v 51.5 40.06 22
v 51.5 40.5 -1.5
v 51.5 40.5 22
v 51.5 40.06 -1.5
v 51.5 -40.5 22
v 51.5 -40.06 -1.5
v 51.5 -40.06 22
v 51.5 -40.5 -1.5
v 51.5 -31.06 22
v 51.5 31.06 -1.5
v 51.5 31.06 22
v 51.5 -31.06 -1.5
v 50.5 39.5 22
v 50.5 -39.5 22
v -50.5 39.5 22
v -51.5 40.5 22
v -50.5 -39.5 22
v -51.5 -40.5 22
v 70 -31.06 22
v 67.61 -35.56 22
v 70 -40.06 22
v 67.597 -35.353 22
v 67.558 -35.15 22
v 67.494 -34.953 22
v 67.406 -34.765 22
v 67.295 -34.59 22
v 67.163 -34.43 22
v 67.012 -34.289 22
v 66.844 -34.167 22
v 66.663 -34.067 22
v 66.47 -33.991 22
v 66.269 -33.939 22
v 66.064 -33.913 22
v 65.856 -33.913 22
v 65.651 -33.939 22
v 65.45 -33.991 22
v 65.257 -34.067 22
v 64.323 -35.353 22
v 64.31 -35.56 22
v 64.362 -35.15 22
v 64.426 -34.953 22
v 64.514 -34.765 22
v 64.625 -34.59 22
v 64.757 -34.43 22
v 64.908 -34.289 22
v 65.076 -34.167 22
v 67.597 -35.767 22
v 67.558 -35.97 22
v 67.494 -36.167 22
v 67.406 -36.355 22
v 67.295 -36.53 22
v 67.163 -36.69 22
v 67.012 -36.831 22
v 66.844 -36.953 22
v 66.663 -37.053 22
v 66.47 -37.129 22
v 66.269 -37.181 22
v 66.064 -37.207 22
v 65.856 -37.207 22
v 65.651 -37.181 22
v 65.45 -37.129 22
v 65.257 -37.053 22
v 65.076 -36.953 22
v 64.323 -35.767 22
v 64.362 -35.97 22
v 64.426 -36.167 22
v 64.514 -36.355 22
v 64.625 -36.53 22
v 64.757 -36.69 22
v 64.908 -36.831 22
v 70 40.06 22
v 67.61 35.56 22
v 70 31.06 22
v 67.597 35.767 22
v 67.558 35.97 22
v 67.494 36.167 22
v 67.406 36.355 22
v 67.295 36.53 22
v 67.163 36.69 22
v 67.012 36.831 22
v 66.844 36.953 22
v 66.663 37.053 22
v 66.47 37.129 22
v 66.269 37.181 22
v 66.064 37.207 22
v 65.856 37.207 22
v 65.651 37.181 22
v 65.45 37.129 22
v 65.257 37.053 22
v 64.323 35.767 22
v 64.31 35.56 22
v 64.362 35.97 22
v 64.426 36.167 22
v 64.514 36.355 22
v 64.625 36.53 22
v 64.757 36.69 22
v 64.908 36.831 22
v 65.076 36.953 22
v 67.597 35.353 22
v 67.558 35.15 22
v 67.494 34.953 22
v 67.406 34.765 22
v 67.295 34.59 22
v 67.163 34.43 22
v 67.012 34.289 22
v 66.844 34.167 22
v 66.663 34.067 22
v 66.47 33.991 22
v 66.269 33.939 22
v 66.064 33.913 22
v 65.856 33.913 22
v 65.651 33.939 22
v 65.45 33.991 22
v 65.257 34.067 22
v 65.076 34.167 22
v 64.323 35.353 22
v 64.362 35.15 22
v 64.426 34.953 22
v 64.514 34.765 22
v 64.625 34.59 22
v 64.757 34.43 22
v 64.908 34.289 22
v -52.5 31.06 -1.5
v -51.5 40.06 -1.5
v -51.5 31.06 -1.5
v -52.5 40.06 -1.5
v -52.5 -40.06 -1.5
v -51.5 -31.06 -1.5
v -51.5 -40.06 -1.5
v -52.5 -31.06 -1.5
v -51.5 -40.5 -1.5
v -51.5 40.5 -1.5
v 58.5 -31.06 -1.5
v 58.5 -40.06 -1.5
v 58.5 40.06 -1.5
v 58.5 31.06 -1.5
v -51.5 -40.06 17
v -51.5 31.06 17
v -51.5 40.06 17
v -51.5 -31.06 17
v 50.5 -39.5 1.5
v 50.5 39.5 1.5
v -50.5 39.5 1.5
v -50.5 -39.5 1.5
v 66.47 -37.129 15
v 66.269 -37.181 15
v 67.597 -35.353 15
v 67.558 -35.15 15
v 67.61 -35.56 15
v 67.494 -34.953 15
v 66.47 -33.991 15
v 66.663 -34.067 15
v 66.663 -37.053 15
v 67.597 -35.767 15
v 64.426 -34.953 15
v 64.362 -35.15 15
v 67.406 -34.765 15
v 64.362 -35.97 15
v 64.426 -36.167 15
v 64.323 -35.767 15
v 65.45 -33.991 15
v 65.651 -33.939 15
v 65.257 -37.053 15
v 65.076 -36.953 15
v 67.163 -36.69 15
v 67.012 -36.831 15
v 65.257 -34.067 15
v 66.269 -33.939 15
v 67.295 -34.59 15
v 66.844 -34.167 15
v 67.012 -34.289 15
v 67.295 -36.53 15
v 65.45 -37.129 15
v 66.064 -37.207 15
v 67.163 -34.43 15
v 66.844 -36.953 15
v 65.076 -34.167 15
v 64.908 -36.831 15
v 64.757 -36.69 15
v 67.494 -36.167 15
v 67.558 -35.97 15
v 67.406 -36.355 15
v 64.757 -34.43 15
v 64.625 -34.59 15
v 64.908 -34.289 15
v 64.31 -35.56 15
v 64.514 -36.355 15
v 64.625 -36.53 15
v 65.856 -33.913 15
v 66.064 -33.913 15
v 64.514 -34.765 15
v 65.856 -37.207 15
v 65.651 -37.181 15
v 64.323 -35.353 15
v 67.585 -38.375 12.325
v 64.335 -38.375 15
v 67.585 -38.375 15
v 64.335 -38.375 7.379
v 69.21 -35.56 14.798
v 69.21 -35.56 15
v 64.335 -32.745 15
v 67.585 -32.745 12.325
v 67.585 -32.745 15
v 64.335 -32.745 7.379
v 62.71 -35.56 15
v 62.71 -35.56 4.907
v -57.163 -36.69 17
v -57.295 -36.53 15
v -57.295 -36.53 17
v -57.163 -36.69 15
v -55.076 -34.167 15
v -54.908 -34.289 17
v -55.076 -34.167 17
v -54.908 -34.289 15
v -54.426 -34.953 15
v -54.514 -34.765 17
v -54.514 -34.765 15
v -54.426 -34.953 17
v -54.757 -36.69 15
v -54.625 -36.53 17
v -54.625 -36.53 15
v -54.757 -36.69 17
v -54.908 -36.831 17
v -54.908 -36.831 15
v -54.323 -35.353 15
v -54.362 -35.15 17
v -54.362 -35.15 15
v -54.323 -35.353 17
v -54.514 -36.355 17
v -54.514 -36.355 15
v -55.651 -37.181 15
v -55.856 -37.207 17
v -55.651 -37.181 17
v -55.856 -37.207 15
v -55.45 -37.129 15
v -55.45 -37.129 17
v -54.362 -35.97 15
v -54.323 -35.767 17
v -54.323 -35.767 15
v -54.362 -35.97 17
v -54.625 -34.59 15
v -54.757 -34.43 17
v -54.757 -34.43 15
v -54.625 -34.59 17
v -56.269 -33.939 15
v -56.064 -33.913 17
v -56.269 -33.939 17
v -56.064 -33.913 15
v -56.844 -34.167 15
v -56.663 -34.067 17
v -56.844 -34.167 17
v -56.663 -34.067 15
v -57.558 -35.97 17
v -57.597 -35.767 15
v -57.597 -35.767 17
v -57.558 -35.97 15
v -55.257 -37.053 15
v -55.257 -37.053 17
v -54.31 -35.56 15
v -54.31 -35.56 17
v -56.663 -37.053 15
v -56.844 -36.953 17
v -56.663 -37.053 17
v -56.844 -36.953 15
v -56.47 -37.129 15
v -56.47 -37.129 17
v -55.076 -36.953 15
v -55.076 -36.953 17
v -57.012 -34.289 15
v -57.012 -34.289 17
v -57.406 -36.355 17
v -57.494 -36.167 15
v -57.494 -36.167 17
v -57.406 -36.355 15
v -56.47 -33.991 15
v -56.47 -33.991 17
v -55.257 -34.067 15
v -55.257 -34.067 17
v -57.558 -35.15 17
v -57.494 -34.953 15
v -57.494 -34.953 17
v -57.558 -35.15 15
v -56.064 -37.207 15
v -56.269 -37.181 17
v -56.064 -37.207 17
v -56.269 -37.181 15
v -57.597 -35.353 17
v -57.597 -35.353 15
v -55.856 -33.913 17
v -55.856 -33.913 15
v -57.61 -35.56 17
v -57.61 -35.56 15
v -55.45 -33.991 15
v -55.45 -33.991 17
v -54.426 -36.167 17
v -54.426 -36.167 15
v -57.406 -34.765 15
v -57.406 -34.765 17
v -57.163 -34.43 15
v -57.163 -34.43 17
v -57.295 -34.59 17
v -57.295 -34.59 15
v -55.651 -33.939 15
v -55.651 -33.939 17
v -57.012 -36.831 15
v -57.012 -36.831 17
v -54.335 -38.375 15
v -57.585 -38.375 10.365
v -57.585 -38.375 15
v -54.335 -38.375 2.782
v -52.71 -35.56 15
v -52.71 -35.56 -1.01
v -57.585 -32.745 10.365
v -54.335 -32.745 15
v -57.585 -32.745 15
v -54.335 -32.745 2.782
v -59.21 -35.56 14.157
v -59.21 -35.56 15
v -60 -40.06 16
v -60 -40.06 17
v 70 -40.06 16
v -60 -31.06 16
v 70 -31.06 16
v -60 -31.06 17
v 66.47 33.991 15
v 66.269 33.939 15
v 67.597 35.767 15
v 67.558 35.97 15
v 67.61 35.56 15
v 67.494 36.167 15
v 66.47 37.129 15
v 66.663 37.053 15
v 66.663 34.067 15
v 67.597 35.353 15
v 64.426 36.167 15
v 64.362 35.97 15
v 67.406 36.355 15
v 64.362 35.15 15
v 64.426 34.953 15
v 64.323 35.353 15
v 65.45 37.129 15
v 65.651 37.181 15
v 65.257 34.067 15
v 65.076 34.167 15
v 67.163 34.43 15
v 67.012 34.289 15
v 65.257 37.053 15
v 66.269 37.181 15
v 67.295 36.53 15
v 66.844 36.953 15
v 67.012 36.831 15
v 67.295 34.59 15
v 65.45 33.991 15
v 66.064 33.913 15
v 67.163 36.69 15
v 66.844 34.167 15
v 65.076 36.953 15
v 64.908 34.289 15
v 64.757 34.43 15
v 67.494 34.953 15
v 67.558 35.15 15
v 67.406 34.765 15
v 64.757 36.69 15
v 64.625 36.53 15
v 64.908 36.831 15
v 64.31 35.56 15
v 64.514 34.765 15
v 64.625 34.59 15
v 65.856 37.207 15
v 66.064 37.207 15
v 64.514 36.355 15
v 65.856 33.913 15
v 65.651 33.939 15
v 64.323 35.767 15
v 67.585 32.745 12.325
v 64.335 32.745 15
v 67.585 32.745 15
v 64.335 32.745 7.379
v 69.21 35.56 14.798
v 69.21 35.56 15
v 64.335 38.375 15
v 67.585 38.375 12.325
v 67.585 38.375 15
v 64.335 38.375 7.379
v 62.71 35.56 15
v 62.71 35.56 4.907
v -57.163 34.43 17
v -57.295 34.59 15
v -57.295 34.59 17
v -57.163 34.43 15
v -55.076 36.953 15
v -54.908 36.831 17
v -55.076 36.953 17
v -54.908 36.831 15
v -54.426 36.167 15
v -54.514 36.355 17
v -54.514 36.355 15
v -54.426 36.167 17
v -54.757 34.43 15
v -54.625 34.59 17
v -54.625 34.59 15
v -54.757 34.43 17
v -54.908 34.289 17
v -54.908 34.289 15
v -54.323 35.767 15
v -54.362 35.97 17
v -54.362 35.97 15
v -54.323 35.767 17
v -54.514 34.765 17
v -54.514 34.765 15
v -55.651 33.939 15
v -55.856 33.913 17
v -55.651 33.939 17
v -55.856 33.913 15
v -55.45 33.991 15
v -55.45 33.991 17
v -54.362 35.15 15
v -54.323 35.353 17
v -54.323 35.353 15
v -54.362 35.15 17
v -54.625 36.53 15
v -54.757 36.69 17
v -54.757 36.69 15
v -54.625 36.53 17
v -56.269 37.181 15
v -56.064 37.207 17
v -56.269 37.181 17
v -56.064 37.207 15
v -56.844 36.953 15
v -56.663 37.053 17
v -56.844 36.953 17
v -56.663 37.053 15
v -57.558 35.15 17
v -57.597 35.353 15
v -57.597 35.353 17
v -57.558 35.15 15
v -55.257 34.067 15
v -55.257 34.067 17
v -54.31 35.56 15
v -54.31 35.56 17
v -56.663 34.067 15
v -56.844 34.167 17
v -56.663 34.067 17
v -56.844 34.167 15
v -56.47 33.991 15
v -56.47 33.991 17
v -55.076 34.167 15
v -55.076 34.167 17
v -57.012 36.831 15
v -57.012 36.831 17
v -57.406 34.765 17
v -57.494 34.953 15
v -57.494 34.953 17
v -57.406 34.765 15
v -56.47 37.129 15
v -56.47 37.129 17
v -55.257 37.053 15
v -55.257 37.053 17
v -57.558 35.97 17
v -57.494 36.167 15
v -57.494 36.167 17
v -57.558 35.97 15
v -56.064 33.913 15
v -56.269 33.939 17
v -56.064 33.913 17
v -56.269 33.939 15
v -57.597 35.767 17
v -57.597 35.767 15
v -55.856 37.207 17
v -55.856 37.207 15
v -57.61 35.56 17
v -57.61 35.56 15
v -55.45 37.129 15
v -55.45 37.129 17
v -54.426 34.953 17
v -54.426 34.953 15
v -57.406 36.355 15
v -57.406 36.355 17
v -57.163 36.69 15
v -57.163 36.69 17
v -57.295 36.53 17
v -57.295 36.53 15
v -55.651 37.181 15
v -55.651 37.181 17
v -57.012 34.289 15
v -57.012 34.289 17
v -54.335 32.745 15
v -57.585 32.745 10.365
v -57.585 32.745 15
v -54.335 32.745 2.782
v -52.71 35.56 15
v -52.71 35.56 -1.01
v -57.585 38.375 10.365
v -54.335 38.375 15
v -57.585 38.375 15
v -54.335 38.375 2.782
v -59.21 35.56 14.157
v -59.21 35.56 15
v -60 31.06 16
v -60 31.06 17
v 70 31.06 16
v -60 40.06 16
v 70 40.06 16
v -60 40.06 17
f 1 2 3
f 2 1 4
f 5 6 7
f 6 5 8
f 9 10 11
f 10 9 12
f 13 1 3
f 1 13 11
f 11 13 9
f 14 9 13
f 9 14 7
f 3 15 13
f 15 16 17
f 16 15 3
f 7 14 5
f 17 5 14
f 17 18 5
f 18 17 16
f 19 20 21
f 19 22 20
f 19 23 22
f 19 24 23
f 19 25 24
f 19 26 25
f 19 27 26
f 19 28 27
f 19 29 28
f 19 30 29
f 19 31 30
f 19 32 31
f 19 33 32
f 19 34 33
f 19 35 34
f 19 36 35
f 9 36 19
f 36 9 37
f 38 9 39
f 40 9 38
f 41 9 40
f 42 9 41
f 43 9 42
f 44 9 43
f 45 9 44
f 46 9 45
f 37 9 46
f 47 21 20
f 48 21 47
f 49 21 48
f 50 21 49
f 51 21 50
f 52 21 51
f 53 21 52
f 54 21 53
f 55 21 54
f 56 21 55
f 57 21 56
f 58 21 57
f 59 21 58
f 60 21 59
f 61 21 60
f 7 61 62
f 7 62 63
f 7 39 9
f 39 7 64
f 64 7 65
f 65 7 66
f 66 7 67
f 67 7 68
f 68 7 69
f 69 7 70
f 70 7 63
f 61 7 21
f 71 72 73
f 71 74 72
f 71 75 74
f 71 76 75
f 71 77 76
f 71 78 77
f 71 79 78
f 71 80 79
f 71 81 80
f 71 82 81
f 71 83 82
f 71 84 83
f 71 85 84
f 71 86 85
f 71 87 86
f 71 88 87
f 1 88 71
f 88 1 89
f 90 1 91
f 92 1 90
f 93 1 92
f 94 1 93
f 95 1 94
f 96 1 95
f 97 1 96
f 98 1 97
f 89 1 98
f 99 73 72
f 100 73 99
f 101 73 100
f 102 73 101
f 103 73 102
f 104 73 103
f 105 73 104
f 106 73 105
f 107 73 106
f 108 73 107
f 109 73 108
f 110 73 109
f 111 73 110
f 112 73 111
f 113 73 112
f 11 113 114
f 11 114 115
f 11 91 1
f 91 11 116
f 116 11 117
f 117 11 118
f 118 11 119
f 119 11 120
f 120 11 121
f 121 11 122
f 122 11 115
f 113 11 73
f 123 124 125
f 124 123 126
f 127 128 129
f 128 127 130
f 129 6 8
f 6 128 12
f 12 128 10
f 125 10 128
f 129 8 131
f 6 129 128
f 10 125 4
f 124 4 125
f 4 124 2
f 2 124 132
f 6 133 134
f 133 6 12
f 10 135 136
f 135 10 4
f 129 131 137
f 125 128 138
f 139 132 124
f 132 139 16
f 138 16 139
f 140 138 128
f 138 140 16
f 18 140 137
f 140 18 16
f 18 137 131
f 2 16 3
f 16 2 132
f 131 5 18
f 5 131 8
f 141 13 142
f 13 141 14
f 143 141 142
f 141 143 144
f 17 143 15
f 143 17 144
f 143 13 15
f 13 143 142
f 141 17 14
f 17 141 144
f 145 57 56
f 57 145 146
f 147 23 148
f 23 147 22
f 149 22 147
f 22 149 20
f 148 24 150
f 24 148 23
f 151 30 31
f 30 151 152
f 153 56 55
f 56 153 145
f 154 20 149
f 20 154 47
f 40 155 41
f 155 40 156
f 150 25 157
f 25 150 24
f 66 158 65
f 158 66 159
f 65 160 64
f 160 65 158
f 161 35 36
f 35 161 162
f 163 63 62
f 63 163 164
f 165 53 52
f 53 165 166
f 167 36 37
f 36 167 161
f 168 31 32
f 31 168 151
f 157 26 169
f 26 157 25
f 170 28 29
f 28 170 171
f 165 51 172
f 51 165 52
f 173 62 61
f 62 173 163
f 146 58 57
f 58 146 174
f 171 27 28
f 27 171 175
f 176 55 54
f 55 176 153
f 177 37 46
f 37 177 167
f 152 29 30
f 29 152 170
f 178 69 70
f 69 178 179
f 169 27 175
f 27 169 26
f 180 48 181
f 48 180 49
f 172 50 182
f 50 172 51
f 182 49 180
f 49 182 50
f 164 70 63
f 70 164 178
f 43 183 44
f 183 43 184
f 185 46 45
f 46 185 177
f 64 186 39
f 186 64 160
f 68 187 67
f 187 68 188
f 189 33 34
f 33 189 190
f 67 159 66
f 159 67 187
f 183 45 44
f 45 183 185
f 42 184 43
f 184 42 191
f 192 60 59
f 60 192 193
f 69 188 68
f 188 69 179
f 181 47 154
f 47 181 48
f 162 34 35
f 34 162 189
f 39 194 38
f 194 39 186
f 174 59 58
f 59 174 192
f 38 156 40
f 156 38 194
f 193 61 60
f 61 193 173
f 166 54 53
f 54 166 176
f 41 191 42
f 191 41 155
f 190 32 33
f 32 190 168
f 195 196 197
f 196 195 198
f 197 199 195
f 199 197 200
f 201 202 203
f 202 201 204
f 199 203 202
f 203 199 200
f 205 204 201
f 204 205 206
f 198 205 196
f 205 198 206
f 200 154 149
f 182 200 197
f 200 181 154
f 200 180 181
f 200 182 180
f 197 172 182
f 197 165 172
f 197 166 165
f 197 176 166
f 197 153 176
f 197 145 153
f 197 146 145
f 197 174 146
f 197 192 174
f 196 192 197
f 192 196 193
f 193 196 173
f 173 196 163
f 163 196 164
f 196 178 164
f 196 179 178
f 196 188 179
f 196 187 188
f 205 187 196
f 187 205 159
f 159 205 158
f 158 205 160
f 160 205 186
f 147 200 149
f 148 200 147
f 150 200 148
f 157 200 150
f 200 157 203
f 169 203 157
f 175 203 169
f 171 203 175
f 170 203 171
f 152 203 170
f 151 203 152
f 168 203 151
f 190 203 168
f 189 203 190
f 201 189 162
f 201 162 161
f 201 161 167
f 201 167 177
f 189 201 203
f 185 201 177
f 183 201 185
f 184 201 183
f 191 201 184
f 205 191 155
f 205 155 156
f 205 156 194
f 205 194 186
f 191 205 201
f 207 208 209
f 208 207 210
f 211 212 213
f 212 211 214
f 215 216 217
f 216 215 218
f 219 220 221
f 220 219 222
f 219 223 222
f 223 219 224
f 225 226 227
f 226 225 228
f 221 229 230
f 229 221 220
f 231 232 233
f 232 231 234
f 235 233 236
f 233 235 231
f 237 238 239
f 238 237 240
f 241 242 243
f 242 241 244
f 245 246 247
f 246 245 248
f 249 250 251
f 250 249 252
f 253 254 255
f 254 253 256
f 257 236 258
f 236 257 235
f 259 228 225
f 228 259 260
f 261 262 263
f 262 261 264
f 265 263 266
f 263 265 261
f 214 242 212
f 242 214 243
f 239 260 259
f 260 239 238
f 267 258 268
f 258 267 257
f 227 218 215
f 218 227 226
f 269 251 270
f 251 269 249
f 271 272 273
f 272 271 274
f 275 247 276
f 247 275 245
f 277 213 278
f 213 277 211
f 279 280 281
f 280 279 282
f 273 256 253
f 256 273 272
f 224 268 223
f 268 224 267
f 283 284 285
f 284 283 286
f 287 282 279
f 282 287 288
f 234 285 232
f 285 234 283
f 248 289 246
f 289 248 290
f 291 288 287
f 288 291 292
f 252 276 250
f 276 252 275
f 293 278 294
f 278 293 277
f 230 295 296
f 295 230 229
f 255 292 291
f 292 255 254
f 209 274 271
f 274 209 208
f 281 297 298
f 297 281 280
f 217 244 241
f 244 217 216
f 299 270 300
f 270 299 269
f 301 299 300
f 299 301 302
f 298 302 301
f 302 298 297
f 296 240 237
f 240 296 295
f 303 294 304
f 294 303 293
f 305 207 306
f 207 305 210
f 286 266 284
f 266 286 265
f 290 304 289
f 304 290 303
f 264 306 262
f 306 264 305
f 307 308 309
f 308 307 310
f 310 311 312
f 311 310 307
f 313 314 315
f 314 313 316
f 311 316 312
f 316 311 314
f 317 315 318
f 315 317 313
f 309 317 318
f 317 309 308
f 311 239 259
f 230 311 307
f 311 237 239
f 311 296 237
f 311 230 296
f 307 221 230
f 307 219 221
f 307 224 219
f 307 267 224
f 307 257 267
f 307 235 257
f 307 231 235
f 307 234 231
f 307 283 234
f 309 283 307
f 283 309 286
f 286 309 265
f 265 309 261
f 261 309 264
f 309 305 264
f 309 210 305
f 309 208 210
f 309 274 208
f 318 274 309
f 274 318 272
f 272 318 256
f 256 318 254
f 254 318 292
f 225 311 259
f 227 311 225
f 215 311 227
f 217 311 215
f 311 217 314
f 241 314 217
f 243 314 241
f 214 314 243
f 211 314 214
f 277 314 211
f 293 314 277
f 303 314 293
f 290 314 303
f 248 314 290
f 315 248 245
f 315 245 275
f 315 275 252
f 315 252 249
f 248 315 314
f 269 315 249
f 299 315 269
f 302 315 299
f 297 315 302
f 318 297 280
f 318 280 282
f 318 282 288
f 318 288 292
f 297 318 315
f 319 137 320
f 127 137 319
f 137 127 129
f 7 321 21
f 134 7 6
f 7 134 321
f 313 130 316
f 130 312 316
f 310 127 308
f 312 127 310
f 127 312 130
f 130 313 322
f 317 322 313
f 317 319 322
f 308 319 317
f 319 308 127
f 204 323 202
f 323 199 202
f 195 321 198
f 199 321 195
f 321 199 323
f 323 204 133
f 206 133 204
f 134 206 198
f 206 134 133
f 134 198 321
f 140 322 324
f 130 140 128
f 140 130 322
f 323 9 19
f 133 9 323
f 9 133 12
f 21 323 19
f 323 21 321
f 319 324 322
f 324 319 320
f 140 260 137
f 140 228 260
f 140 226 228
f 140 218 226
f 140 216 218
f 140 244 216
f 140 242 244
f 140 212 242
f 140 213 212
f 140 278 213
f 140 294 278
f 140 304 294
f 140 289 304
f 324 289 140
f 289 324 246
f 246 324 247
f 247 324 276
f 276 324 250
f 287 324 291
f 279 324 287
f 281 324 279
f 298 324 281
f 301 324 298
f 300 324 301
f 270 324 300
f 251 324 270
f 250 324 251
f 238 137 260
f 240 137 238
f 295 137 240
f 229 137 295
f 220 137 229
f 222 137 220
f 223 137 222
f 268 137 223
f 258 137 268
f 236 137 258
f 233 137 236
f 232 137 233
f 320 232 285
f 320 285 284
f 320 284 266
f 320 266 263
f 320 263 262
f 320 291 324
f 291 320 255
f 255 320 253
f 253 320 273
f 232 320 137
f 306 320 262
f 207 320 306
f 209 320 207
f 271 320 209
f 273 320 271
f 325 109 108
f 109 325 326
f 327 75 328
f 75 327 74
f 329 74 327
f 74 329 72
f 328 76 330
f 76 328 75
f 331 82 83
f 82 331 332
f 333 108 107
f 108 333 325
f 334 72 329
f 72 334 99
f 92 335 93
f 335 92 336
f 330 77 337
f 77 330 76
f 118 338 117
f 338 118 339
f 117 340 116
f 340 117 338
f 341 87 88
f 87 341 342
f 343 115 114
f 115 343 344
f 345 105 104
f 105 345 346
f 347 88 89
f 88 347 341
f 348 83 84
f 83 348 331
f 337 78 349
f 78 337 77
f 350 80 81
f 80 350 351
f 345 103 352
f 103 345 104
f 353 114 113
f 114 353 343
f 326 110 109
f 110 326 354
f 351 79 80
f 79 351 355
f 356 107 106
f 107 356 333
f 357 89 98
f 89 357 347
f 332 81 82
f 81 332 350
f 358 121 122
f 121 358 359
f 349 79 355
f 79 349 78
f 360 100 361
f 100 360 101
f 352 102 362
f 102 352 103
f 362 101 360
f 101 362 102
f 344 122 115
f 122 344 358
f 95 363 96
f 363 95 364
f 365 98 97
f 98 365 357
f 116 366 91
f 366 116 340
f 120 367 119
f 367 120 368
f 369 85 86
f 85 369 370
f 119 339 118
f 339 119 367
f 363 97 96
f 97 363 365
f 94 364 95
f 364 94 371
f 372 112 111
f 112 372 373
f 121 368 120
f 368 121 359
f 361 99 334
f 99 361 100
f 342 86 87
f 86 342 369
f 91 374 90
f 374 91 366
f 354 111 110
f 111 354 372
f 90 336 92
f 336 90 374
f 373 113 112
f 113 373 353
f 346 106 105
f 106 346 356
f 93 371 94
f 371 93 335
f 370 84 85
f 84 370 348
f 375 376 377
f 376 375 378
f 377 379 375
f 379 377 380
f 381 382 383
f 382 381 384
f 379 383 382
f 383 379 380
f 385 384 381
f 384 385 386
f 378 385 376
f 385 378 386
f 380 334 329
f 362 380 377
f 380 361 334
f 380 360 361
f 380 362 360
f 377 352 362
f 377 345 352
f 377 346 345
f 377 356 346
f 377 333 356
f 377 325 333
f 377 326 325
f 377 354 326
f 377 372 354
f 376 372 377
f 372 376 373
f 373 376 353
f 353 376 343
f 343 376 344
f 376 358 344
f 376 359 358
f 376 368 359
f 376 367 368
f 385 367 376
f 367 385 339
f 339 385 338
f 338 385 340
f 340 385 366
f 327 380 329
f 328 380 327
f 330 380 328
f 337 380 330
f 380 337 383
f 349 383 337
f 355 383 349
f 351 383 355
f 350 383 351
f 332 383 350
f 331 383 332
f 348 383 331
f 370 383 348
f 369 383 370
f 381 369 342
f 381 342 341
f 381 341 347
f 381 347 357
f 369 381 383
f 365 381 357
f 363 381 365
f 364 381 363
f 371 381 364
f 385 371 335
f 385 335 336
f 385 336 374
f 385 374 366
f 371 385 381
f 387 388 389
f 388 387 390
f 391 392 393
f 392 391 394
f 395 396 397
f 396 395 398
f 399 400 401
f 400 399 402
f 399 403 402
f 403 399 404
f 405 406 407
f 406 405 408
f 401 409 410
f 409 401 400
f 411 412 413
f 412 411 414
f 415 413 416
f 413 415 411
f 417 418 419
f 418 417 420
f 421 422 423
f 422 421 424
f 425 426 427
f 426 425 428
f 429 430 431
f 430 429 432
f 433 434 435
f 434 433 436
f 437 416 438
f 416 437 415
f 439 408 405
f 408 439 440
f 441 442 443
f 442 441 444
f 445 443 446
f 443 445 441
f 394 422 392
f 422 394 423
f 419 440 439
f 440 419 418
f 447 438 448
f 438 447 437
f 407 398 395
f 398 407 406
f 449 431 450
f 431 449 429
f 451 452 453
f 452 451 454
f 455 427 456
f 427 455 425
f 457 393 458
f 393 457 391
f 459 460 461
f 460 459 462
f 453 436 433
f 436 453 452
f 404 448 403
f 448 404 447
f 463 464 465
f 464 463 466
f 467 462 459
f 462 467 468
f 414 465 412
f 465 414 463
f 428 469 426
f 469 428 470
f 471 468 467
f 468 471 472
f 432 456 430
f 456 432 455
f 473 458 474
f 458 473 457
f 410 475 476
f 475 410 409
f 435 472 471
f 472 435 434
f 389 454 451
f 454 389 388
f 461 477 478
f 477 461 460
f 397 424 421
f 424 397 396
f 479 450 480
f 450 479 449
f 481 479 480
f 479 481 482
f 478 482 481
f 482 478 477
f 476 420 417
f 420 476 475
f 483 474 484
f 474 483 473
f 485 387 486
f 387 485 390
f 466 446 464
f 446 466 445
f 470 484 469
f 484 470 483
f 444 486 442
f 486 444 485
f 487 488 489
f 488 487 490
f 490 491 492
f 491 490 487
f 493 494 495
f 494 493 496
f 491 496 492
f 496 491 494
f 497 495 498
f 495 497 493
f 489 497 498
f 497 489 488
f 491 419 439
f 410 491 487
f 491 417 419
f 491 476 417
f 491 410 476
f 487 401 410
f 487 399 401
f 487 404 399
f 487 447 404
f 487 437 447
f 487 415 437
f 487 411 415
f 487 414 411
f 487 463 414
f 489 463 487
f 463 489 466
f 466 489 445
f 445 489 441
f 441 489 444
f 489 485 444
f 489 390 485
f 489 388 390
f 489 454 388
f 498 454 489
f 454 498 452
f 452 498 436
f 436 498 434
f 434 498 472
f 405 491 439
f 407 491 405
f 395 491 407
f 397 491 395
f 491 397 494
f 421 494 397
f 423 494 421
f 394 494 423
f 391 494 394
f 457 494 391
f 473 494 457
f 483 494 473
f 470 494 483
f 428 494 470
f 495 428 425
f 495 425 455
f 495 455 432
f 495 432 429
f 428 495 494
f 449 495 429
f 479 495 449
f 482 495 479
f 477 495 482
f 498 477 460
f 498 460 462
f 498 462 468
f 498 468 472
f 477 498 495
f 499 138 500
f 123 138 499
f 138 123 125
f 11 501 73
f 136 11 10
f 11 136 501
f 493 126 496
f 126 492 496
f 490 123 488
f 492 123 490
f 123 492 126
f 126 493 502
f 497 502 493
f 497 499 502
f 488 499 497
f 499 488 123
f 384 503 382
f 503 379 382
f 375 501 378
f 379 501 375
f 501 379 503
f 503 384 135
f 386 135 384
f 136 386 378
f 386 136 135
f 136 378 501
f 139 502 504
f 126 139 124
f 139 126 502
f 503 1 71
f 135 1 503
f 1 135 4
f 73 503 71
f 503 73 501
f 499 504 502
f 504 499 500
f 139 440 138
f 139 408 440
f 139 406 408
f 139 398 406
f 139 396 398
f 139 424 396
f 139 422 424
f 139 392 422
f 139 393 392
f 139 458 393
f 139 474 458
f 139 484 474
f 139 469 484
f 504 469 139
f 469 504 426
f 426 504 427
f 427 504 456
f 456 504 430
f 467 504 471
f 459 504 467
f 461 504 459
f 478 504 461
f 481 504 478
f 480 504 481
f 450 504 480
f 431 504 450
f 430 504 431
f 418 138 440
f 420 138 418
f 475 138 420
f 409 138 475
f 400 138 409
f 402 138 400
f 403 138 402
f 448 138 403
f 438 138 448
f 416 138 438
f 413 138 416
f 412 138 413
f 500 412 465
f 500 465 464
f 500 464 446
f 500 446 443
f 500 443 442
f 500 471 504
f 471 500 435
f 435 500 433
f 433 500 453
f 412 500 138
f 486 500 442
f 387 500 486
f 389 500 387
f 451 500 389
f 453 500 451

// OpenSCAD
module battery_case(){

battery_length = 101;
battery_width = 79;
battery_height = 22;
wall_around = 1;
wall_top = 1.5;


beam_length = 130;
beam_thickness = 9;
front_offset = 6;

screw_distance = 10.16*12;


difference(){
    translate([0, 0, battery_height/2-wall_top/2]) cube([battery_length+wall_around*2, battery_width+wall_around*2, battery_height+wall_top], center=true);
    translate([0, 0, battery_height/2+wall_top]) cube([battery_length, battery_width, battery_height], center=true);
}


offset = 5;

for(y=[-0.5, 0.5]) translate([0, y*10.16*7, 0]) difference(){
hull(){
    translate([offset, 0, battery_height-3]) cube([beam_length, beam_thickness, 6], center=true);
    translate([3, 0, 0.05]) cube([battery_length+2*wall_around+5+3, beam_thickness, 0.1+wall_top*2], center=true);

}
    translate([0, 0, battery_height/2+wall_top]) cube([battery_length, battery_width, battery_height], center=true);
    
    translate([-20, 0, battery_height*1.5-5]) cube([battery_length, battery_width, battery_height], center=true);
    

for(x=[0.5, -0.5]) translate([offset+screw_distance*x, 0, 0]){
    cylinder(d=3.3, h=50, center=true, $fn=50);
    cylinder(d=6.5, h=30, center=true, $fn=6);

}
}


}



battery_case();
